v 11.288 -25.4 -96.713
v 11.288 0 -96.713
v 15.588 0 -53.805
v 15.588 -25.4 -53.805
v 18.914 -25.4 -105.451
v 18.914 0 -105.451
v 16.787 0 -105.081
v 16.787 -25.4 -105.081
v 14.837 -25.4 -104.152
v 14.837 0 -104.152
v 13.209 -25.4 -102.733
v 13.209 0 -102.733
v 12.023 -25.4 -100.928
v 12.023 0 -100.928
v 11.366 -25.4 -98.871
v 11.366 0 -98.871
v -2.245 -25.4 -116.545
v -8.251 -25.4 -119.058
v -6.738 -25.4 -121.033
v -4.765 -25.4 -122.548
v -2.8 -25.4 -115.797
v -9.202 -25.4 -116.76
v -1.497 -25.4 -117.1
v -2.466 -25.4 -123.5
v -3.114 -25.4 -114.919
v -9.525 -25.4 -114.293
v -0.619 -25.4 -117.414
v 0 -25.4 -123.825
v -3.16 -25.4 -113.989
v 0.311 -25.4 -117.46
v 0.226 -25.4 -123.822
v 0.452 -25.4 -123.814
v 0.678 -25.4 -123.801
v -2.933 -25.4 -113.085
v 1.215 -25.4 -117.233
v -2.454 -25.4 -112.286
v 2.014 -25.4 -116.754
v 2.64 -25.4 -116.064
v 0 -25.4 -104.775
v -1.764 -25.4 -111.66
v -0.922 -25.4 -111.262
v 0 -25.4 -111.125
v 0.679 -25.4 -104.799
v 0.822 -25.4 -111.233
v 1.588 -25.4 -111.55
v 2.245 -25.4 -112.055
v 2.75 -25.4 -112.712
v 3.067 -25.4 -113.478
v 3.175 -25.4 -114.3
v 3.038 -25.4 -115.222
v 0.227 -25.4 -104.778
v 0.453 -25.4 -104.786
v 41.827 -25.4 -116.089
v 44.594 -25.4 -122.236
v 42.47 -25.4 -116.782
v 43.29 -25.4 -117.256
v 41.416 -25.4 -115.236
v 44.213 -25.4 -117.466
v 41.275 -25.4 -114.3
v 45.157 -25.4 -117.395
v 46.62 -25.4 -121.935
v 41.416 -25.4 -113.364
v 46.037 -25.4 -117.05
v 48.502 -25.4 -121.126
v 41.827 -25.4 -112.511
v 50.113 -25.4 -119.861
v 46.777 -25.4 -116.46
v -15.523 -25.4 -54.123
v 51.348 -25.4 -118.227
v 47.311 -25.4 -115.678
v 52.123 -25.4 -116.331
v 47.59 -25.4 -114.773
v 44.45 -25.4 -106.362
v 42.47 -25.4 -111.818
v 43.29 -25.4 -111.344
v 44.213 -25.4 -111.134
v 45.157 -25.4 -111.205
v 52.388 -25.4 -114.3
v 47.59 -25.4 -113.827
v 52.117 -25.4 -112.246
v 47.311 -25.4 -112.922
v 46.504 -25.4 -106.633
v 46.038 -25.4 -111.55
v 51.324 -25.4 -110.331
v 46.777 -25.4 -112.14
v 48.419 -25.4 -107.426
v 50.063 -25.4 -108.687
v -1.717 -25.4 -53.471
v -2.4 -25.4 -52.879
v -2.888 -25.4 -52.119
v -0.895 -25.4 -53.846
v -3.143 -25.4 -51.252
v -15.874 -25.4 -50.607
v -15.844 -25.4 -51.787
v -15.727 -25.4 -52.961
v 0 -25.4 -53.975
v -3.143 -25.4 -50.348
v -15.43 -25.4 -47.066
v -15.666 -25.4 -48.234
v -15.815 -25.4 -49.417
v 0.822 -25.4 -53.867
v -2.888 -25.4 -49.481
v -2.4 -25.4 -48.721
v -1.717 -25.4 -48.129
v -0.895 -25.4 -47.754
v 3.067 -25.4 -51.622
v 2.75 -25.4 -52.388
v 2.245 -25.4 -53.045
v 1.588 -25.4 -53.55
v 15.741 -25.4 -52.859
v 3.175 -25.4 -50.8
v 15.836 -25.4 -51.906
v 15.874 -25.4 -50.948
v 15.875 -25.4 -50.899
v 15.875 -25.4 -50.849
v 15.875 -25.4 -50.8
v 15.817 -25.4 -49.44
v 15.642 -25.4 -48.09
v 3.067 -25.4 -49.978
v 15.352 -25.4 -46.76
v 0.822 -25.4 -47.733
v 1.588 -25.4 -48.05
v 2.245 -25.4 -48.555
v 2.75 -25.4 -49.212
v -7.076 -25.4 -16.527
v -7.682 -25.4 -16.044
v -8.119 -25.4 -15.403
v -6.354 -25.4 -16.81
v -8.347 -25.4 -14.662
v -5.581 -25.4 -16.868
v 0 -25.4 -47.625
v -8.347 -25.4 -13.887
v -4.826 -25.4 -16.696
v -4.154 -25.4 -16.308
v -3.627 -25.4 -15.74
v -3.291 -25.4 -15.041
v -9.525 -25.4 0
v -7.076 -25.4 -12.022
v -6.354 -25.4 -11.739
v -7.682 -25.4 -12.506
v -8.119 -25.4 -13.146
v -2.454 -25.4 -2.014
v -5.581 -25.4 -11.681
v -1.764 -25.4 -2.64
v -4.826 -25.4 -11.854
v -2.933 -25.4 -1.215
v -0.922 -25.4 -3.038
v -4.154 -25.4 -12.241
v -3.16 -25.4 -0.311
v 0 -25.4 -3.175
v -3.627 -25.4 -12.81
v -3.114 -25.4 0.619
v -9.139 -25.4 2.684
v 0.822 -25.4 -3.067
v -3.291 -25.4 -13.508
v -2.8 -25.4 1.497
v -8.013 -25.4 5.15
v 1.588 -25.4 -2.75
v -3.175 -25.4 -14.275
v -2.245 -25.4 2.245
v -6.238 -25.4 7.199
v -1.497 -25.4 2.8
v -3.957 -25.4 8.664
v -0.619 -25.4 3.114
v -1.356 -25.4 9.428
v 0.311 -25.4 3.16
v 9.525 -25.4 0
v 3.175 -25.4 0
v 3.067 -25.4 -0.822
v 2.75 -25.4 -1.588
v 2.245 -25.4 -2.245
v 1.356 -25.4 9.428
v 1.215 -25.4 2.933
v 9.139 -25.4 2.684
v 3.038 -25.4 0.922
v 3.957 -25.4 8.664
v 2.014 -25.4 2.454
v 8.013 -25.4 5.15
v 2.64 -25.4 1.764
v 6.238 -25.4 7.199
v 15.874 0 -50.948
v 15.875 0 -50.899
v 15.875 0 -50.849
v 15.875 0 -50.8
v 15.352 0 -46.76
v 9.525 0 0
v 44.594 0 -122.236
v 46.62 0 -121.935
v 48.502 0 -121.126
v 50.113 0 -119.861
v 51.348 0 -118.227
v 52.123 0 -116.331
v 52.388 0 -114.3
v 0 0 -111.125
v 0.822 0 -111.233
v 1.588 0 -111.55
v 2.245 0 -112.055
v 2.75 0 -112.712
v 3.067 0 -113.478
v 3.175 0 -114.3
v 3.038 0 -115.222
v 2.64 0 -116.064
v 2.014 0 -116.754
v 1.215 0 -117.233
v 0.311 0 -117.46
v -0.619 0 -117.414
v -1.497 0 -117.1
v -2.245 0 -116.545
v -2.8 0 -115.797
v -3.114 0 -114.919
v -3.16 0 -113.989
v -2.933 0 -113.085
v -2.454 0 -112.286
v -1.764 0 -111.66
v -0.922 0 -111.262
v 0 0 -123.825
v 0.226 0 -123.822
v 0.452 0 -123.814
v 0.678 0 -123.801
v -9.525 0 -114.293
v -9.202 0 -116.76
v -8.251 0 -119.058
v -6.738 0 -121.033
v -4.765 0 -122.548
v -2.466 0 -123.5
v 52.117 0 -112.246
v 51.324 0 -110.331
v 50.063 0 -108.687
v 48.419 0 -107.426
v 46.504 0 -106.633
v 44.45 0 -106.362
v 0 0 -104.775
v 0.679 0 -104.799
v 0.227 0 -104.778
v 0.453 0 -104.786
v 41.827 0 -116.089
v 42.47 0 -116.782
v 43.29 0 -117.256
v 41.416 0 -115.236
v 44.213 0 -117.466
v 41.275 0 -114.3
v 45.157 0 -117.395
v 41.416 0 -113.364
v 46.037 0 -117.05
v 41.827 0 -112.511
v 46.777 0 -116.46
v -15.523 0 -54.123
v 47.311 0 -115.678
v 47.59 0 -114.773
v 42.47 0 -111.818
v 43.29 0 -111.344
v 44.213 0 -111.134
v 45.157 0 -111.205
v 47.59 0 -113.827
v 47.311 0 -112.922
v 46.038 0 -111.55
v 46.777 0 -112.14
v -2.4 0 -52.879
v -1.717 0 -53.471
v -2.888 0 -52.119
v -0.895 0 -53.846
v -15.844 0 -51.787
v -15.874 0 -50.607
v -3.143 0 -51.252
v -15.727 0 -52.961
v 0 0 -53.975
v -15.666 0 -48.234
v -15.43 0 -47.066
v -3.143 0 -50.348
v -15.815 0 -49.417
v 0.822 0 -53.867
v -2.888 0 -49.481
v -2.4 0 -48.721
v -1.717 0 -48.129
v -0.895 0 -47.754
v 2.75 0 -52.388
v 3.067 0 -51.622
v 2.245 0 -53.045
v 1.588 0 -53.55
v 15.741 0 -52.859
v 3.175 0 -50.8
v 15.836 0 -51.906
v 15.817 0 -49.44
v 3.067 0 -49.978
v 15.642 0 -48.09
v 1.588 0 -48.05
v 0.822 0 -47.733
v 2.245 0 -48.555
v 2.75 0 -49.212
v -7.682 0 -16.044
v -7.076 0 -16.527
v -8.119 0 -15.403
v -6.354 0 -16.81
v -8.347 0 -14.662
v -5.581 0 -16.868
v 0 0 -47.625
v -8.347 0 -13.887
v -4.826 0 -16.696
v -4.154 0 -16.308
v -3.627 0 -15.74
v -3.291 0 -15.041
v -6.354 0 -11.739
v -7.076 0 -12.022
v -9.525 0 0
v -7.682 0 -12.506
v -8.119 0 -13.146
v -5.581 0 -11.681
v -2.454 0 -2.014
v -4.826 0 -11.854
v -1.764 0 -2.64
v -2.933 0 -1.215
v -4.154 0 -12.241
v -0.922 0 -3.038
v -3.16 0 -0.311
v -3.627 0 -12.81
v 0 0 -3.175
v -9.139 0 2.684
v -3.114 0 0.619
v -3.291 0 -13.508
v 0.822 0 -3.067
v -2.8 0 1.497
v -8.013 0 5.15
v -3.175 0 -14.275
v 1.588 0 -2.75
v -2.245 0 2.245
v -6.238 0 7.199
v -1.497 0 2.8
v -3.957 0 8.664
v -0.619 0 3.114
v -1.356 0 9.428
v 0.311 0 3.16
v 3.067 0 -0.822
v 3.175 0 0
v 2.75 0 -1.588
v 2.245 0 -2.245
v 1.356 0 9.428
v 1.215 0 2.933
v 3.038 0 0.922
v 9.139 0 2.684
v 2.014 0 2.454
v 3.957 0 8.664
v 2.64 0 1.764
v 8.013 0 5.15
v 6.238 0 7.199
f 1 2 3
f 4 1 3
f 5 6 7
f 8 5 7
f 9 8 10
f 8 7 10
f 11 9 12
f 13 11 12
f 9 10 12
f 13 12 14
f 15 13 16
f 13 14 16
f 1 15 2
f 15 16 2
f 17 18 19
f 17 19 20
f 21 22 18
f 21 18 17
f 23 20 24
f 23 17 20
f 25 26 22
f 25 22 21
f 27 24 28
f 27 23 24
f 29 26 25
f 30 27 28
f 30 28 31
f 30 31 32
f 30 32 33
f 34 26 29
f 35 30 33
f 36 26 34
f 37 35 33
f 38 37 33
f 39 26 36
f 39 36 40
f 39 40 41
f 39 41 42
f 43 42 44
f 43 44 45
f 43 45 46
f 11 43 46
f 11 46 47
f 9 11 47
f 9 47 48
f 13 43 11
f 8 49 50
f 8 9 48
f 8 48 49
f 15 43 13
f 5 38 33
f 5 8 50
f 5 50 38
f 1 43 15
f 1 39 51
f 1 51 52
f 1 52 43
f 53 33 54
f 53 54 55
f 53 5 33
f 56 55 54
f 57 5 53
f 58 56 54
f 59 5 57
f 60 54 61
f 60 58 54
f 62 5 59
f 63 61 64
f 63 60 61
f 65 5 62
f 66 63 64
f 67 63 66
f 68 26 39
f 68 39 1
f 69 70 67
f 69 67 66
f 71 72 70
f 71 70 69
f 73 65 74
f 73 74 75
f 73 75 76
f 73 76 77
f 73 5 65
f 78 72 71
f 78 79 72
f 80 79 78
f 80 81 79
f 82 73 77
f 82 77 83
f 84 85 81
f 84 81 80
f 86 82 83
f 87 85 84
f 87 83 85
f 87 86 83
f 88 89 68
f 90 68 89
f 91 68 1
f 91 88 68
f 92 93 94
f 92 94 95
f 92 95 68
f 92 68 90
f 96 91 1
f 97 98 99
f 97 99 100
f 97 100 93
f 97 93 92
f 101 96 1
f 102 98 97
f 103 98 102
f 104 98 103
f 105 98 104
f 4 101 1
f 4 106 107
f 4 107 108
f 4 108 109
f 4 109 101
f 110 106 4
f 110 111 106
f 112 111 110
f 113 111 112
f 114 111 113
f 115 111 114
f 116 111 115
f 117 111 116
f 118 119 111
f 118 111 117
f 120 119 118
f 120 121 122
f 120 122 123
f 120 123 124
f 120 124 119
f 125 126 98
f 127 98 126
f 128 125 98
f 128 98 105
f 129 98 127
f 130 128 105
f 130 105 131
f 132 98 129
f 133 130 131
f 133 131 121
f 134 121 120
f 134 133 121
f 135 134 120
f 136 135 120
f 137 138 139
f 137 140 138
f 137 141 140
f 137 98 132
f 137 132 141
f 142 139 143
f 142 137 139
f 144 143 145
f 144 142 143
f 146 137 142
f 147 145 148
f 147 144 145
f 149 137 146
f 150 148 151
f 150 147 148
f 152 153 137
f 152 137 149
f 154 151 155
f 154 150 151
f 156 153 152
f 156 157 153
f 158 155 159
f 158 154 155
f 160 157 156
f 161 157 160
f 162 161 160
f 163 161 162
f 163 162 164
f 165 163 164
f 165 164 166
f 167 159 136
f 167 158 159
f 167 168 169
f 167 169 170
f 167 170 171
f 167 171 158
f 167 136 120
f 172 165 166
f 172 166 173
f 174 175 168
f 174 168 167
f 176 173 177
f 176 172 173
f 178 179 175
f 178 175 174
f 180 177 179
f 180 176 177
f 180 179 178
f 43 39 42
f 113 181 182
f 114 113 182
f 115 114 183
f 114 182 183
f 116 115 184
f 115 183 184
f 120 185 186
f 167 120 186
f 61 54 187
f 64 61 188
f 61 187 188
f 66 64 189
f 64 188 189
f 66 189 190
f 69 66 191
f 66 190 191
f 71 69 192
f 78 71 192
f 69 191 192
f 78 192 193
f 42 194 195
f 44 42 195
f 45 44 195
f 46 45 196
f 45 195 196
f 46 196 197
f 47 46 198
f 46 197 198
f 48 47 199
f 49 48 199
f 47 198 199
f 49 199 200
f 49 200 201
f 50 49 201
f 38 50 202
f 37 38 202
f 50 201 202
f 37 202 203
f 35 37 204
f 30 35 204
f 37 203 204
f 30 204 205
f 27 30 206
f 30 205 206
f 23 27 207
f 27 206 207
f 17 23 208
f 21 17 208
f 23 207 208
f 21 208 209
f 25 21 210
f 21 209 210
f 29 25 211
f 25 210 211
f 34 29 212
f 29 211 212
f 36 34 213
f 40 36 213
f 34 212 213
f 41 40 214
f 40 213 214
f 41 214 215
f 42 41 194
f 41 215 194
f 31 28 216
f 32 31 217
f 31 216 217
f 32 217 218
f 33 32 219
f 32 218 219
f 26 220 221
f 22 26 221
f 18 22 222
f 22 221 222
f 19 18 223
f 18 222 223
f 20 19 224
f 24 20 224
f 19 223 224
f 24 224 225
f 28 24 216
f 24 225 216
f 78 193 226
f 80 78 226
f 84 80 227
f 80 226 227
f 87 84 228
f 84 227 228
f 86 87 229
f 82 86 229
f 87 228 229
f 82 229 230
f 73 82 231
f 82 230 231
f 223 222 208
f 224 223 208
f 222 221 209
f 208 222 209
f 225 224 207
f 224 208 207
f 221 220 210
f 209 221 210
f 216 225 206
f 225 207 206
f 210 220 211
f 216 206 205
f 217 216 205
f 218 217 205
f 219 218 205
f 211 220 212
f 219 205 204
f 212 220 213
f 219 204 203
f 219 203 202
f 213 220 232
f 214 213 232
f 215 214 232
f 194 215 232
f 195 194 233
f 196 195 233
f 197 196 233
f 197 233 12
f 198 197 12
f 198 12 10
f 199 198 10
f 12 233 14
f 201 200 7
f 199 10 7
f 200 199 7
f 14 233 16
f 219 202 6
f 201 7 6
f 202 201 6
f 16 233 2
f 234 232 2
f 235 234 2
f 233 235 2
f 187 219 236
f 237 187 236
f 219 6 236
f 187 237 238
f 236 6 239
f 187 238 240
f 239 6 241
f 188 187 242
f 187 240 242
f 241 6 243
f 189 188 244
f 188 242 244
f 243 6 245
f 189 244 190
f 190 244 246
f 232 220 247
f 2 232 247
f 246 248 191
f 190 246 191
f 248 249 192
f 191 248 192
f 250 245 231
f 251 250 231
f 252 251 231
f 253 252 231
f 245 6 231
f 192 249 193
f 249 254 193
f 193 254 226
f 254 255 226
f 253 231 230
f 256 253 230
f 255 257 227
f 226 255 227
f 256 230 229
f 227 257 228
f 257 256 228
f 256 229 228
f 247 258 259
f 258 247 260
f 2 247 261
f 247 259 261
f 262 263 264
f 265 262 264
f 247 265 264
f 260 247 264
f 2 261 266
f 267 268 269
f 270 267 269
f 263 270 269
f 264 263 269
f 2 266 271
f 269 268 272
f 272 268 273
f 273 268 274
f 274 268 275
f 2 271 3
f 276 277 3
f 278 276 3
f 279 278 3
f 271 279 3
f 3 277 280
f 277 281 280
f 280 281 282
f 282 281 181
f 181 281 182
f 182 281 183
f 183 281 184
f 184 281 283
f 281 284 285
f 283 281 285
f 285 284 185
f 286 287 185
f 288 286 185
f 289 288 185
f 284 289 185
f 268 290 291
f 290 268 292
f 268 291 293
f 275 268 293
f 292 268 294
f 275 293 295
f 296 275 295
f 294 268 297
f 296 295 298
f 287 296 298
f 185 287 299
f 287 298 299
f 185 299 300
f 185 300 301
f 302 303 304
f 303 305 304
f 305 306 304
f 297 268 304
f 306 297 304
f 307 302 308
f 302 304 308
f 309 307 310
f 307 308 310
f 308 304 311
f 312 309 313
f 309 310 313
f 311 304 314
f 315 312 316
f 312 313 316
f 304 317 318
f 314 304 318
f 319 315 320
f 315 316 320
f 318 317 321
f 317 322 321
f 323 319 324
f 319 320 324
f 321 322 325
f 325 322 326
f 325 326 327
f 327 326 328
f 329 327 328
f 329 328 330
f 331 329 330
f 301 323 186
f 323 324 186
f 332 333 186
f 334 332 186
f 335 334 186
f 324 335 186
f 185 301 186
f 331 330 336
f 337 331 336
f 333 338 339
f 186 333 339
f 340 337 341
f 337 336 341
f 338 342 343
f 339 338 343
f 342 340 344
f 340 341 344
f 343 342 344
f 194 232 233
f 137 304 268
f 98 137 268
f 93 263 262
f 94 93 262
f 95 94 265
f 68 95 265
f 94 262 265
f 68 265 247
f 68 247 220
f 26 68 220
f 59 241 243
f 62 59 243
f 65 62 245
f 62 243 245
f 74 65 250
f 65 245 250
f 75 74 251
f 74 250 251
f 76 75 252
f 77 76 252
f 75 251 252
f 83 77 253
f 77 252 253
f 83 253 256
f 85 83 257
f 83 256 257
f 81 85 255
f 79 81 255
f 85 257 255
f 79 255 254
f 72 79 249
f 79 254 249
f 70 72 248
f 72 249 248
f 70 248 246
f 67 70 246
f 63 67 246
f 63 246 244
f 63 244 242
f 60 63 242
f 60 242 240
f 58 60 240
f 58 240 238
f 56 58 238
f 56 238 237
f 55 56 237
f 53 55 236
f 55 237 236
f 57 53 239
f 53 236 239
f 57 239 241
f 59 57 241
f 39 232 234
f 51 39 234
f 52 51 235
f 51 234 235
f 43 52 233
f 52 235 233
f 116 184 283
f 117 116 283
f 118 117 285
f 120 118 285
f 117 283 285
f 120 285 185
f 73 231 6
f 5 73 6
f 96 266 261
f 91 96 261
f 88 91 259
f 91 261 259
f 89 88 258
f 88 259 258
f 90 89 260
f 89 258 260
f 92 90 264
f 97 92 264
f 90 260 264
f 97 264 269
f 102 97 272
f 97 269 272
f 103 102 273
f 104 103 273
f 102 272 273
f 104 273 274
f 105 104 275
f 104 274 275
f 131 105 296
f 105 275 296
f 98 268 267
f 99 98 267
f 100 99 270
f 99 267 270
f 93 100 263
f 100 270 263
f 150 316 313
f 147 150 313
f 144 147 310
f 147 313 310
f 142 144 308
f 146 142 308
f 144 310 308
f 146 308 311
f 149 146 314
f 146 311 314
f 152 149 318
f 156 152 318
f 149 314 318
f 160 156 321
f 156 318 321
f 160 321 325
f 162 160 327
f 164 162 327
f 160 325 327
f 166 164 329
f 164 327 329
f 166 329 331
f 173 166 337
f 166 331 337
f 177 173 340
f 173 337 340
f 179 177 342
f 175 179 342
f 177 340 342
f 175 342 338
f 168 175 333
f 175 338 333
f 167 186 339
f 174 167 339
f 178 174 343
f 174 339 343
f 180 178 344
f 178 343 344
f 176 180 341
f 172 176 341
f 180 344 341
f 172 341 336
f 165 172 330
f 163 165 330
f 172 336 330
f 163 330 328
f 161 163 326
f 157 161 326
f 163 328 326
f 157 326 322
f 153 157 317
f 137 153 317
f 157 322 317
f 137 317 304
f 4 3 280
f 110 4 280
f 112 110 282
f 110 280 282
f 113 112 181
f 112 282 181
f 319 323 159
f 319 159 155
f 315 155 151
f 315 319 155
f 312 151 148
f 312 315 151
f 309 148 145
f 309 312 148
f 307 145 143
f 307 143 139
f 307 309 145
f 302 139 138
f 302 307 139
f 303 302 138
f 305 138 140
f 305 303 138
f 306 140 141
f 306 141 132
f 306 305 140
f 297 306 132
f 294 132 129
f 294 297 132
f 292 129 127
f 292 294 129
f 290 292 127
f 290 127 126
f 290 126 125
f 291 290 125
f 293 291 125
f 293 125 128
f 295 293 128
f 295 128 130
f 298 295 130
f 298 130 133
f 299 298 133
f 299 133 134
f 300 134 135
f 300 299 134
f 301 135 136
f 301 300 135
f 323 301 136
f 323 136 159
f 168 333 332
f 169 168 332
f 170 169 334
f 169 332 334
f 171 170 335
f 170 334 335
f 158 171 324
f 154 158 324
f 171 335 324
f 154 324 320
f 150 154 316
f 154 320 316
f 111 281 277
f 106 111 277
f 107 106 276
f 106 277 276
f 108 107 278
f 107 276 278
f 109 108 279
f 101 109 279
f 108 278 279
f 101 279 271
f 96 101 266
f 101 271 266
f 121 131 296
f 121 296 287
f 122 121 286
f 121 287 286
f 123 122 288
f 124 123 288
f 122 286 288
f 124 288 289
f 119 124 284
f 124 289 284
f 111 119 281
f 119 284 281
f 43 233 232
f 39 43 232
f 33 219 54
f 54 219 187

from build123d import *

# Parameters (mm, degrees)
F0_R     = 2.6007380418
F1_DEPTH = 25.4


with BuildPart() as f1:
    # F0 (on Front) → F1 (new body)
    with BuildSketch(Plane.XZ):
        with BuildLine():
            Line((-15.8738293827, -50.6072158518), (-15.4295331686, -47.0656819632))
            ThreePointArc((-15.4295331686, -47.0656819632), (-15.751531428, -48.8239224018), (-15.8738293827, -50.6072158518))
        make_face()
        with BuildLine():
            Line((-15.5233638186, -54.1227700425), (-15.8738293827, -50.6072158518))
            ThreePointArc((-15.8738293827, -50.6072158518), (-15.7966995144, -52.3747728257), (-15.5233638186, -54.1227700425))
        make_face()
        with BuildLine():
            ThreePointArc((15.5879837413, -53.8050603789), (15.7958662647, -52.38310895), (15.874308373, -50.9481846156))
            Line((15.874308373, -50.9481846156), (15.5879837413, -53.8050603789))
        make_face()
        with BuildLine():
            ThreePointArc((15.875, -50.8), (15.7438070308, -48.7632955104), (15.352396513, -46.7602541779))
            Line((15.352396513, -46.7602541779), (15.874308373, -50.9481846156))
            ThreePointArc((15.874308373, -50.9481846156), (15.8748270923, -50.8740931148), (15.875, -50.8))
        make_face()
        with BuildLine():
            Line((0.6778573649, -123.8008491406), (0, -123.825))
            ThreePointArc((0, -123.825), (0.3391437273, -123.8189603703), (0.6778573649, -123.8008491406))
        make_face()
        with BuildLine():
            ThreePointArc((9.525, 0), (6.7351920908, -6.7351920908), (0, -9.525))
            Line((0, -9.525), (0, -34.925))
            ThreePointArc((0, -34.925), (9.6923851573, -38.227279731), (15.352396513, -46.7602541779))
            Line((15.352396513, -46.7602541779), (9.525, 0))
        make_face()
        with BuildLine():
            Line((0, -104.775), (0, -66.675))
            ThreePointArc((0, -66.675), (-9.9816494272, -63.14432257), (-15.5233638186, -54.1227700425))
            Line((-15.5233638186, -54.1227700425), (-9.5249974039, -114.2929674737))
            ThreePointArc((-9.5249974039, -114.2929674737), (-6.7327052582, -107.5623219944), (0, -104.775))
        make_face()
        with BuildLine():
            Line((36.5125, -114.3), (9.525, -114.3))
            ThreePointArc((9.525, -114.3), (6.9707322571, -120.7911105983), (0.6778573649, -123.8008491406))
            Line((0.6778573649, -123.8008491406), (44.5940537667, -122.236192712))
            ThreePointArc((44.5940537667, -122.236192712), (38.888503822, -119.9633617677), (36.5125, -114.3))
        make_face()
        with BuildLine():
            ThreePointArc((52.3875, -114.3), (50.0626600757, -108.6873399243), (44.45, -106.3625))
            ThreePointArc((44.45, -106.3625), (38.8373399243, -108.6873399243), (36.5125, -114.3))
            ThreePointArc((36.5125, -114.3), (38.888503822, -119.9633617677), (44.5940537667, -122.236192712))
            ThreePointArc((44.5940537667, -122.236192712), (50.1133617677, -119.861496178), (52.3875, -114.3))
        make_face()
        with BuildLine():
            ThreePointArc((47.625, -114.3), (44.45, -117.475), (41.275, -114.3))
            ThreePointArc((41.275, -114.3), (44.45, -111.125), (47.625, -114.3))
        make_face(mode=Mode.SUBTRACT)
        with BuildLine():
            ThreePointArc((-9.525, 0), (-6.7351920908, -6.7351920908), (0, -9.525))
            ThreePointArc((0, -9.525), (6.7351920908, -6.7351920908), (9.525, 0))
            ThreePointArc((9.525, 0), (0, 9.525), (-9.525, 0))
        make_face()
        with BuildLine():
            ThreePointArc((3.175, 0), (2.2450640303, -2.2450640303), (0, -3.175))
            ThreePointArc((0, -3.175), (-2.2450640303, 2.2450640303), (3.175, 0))
        make_face(mode=Mode.SUBTRACT)
        with BuildLine():
            Line((0, -111.125), (0, -104.775))
            ThreePointArc((0, -104.775), (-6.7327052582, -107.5623219944), (-9.5249974039, -114.2929674737))
            ThreePointArc((-9.5249974039, -114.2929674737), (-6.7376780056, -121.0327052582), (0, -123.825))
            Line((0, -123.825), (0.6778573649, -123.8008491406))
            ThreePointArc((0.6778573649, -123.8008491406), (6.9707322571, -120.7911105983), (9.525, -114.3))
            Line((9.525, -114.3), (3.175, -114.3))
            ThreePointArc((3.175, -114.3), (-2.2450640303, -116.5450640303), (0, -111.125))
        make_face()
        with BuildLine():
            ThreePointArc((15.5879837413, -53.8050603789), (10.1071828787, -63.0417514783), (0, -66.675))
            Line((0, -66.675), (0, -104.775))
            ThreePointArc((0, -104.775), (0.3399618281, -104.7810688123), (0.6794904459, -104.7992675159))
            ThreePointArc((0.6794904459, -104.7992675159), (6.9712901065, -107.8094885216), (9.525, -114.3))
            Line((9.525, -114.3), (36.5125, -114.3))
            ThreePointArc((36.5125, -114.3), (38.8373399243, -108.6873399243), (44.45, -106.3625))
            Line((44.45, -106.3625), (18.914480682, -105.4505171672))
            ThreePointArc((18.914480682, -105.4505171672), (13.2086857771, -102.7332860354), (11.2876656625, -96.7125616404))
            Line((11.2876656625, -96.7125616404), (15.5879837413, -53.8050603789))
        make_face()
        with BuildLine():
            Line((0, -34.925), (0, -9.525))
            ThreePointArc((0, -9.525), (-6.7351920908, -6.7351920908), (-9.525, 0))
            Line((-9.525, 0), (-15.4295331686, -47.0656819632))
            ThreePointArc((-15.4295331686, -47.0656819632), (-9.8166523359, -38.3240646877), (0, -34.925))
        make_face()
        with Locations((-5.7757380418, -14.2748)):
            Circle(F0_R, mode=Mode.SUBTRACT)
        with BuildLine():
            Line((0, -47.625), (0, -34.925))
            ThreePointArc((0, -34.925), (-9.8166523359, -38.3240646877), (-15.4295331686, -47.0656819632))
            Line((-15.4295331686, -47.0656819632), (-15.8738293827, -50.6072158518))
            Line((-15.8738293827, -50.6072158518), (-15.5233638186, -54.1227700425))
            ThreePointArc((-15.5233638186, -54.1227700425), (-9.9816494272, -63.14432257), (0, -66.675))
            Line((0, -66.675), (0, -53.975))
            ThreePointArc((0, -53.975), (-3.175, -50.8), (0, -47.625))
        make_face()
        with BuildLine():
            ThreePointArc((15.352396513, -46.7602541779), (9.6923851573, -38.227279731), (0, -34.925))
            Line((0, -34.925), (0, -47.625))
            ThreePointArc((0, -47.625), (2.2450640303, -48.5549359697), (3.175, -50.8))
            ThreePointArc((3.175, -50.8), (2.2450640303, -53.0450640303), (0, -53.975))
            Line((0, -53.975), (0, -66.675))
            ThreePointArc((0, -66.675), (10.1071828787, -63.0417514783), (15.5879837413, -53.8050603789))
            Line((15.5879837413, -53.8050603789), (15.874308373, -50.9481846156))
            Line((15.874308373, -50.9481846156), (15.352396513, -46.7602541779))
        make_face()
        with BuildLine():
            Line((0.6794904459, -104.7992675159), (0, -104.775))
            Line((0, -104.775), (0, -111.125))
            ThreePointArc((0, -111.125), (2.2450640303, -112.0549359697), (3.175, -114.3))
            Line((3.175, -114.3), (9.525, -114.3))
            ThreePointArc((9.525, -114.3), (6.9712901065, -107.8094885216), (0.6794904459, -104.7992675159))
        make_face()
    extrude(amount=F1_DEPTH)


solid = f1.part
